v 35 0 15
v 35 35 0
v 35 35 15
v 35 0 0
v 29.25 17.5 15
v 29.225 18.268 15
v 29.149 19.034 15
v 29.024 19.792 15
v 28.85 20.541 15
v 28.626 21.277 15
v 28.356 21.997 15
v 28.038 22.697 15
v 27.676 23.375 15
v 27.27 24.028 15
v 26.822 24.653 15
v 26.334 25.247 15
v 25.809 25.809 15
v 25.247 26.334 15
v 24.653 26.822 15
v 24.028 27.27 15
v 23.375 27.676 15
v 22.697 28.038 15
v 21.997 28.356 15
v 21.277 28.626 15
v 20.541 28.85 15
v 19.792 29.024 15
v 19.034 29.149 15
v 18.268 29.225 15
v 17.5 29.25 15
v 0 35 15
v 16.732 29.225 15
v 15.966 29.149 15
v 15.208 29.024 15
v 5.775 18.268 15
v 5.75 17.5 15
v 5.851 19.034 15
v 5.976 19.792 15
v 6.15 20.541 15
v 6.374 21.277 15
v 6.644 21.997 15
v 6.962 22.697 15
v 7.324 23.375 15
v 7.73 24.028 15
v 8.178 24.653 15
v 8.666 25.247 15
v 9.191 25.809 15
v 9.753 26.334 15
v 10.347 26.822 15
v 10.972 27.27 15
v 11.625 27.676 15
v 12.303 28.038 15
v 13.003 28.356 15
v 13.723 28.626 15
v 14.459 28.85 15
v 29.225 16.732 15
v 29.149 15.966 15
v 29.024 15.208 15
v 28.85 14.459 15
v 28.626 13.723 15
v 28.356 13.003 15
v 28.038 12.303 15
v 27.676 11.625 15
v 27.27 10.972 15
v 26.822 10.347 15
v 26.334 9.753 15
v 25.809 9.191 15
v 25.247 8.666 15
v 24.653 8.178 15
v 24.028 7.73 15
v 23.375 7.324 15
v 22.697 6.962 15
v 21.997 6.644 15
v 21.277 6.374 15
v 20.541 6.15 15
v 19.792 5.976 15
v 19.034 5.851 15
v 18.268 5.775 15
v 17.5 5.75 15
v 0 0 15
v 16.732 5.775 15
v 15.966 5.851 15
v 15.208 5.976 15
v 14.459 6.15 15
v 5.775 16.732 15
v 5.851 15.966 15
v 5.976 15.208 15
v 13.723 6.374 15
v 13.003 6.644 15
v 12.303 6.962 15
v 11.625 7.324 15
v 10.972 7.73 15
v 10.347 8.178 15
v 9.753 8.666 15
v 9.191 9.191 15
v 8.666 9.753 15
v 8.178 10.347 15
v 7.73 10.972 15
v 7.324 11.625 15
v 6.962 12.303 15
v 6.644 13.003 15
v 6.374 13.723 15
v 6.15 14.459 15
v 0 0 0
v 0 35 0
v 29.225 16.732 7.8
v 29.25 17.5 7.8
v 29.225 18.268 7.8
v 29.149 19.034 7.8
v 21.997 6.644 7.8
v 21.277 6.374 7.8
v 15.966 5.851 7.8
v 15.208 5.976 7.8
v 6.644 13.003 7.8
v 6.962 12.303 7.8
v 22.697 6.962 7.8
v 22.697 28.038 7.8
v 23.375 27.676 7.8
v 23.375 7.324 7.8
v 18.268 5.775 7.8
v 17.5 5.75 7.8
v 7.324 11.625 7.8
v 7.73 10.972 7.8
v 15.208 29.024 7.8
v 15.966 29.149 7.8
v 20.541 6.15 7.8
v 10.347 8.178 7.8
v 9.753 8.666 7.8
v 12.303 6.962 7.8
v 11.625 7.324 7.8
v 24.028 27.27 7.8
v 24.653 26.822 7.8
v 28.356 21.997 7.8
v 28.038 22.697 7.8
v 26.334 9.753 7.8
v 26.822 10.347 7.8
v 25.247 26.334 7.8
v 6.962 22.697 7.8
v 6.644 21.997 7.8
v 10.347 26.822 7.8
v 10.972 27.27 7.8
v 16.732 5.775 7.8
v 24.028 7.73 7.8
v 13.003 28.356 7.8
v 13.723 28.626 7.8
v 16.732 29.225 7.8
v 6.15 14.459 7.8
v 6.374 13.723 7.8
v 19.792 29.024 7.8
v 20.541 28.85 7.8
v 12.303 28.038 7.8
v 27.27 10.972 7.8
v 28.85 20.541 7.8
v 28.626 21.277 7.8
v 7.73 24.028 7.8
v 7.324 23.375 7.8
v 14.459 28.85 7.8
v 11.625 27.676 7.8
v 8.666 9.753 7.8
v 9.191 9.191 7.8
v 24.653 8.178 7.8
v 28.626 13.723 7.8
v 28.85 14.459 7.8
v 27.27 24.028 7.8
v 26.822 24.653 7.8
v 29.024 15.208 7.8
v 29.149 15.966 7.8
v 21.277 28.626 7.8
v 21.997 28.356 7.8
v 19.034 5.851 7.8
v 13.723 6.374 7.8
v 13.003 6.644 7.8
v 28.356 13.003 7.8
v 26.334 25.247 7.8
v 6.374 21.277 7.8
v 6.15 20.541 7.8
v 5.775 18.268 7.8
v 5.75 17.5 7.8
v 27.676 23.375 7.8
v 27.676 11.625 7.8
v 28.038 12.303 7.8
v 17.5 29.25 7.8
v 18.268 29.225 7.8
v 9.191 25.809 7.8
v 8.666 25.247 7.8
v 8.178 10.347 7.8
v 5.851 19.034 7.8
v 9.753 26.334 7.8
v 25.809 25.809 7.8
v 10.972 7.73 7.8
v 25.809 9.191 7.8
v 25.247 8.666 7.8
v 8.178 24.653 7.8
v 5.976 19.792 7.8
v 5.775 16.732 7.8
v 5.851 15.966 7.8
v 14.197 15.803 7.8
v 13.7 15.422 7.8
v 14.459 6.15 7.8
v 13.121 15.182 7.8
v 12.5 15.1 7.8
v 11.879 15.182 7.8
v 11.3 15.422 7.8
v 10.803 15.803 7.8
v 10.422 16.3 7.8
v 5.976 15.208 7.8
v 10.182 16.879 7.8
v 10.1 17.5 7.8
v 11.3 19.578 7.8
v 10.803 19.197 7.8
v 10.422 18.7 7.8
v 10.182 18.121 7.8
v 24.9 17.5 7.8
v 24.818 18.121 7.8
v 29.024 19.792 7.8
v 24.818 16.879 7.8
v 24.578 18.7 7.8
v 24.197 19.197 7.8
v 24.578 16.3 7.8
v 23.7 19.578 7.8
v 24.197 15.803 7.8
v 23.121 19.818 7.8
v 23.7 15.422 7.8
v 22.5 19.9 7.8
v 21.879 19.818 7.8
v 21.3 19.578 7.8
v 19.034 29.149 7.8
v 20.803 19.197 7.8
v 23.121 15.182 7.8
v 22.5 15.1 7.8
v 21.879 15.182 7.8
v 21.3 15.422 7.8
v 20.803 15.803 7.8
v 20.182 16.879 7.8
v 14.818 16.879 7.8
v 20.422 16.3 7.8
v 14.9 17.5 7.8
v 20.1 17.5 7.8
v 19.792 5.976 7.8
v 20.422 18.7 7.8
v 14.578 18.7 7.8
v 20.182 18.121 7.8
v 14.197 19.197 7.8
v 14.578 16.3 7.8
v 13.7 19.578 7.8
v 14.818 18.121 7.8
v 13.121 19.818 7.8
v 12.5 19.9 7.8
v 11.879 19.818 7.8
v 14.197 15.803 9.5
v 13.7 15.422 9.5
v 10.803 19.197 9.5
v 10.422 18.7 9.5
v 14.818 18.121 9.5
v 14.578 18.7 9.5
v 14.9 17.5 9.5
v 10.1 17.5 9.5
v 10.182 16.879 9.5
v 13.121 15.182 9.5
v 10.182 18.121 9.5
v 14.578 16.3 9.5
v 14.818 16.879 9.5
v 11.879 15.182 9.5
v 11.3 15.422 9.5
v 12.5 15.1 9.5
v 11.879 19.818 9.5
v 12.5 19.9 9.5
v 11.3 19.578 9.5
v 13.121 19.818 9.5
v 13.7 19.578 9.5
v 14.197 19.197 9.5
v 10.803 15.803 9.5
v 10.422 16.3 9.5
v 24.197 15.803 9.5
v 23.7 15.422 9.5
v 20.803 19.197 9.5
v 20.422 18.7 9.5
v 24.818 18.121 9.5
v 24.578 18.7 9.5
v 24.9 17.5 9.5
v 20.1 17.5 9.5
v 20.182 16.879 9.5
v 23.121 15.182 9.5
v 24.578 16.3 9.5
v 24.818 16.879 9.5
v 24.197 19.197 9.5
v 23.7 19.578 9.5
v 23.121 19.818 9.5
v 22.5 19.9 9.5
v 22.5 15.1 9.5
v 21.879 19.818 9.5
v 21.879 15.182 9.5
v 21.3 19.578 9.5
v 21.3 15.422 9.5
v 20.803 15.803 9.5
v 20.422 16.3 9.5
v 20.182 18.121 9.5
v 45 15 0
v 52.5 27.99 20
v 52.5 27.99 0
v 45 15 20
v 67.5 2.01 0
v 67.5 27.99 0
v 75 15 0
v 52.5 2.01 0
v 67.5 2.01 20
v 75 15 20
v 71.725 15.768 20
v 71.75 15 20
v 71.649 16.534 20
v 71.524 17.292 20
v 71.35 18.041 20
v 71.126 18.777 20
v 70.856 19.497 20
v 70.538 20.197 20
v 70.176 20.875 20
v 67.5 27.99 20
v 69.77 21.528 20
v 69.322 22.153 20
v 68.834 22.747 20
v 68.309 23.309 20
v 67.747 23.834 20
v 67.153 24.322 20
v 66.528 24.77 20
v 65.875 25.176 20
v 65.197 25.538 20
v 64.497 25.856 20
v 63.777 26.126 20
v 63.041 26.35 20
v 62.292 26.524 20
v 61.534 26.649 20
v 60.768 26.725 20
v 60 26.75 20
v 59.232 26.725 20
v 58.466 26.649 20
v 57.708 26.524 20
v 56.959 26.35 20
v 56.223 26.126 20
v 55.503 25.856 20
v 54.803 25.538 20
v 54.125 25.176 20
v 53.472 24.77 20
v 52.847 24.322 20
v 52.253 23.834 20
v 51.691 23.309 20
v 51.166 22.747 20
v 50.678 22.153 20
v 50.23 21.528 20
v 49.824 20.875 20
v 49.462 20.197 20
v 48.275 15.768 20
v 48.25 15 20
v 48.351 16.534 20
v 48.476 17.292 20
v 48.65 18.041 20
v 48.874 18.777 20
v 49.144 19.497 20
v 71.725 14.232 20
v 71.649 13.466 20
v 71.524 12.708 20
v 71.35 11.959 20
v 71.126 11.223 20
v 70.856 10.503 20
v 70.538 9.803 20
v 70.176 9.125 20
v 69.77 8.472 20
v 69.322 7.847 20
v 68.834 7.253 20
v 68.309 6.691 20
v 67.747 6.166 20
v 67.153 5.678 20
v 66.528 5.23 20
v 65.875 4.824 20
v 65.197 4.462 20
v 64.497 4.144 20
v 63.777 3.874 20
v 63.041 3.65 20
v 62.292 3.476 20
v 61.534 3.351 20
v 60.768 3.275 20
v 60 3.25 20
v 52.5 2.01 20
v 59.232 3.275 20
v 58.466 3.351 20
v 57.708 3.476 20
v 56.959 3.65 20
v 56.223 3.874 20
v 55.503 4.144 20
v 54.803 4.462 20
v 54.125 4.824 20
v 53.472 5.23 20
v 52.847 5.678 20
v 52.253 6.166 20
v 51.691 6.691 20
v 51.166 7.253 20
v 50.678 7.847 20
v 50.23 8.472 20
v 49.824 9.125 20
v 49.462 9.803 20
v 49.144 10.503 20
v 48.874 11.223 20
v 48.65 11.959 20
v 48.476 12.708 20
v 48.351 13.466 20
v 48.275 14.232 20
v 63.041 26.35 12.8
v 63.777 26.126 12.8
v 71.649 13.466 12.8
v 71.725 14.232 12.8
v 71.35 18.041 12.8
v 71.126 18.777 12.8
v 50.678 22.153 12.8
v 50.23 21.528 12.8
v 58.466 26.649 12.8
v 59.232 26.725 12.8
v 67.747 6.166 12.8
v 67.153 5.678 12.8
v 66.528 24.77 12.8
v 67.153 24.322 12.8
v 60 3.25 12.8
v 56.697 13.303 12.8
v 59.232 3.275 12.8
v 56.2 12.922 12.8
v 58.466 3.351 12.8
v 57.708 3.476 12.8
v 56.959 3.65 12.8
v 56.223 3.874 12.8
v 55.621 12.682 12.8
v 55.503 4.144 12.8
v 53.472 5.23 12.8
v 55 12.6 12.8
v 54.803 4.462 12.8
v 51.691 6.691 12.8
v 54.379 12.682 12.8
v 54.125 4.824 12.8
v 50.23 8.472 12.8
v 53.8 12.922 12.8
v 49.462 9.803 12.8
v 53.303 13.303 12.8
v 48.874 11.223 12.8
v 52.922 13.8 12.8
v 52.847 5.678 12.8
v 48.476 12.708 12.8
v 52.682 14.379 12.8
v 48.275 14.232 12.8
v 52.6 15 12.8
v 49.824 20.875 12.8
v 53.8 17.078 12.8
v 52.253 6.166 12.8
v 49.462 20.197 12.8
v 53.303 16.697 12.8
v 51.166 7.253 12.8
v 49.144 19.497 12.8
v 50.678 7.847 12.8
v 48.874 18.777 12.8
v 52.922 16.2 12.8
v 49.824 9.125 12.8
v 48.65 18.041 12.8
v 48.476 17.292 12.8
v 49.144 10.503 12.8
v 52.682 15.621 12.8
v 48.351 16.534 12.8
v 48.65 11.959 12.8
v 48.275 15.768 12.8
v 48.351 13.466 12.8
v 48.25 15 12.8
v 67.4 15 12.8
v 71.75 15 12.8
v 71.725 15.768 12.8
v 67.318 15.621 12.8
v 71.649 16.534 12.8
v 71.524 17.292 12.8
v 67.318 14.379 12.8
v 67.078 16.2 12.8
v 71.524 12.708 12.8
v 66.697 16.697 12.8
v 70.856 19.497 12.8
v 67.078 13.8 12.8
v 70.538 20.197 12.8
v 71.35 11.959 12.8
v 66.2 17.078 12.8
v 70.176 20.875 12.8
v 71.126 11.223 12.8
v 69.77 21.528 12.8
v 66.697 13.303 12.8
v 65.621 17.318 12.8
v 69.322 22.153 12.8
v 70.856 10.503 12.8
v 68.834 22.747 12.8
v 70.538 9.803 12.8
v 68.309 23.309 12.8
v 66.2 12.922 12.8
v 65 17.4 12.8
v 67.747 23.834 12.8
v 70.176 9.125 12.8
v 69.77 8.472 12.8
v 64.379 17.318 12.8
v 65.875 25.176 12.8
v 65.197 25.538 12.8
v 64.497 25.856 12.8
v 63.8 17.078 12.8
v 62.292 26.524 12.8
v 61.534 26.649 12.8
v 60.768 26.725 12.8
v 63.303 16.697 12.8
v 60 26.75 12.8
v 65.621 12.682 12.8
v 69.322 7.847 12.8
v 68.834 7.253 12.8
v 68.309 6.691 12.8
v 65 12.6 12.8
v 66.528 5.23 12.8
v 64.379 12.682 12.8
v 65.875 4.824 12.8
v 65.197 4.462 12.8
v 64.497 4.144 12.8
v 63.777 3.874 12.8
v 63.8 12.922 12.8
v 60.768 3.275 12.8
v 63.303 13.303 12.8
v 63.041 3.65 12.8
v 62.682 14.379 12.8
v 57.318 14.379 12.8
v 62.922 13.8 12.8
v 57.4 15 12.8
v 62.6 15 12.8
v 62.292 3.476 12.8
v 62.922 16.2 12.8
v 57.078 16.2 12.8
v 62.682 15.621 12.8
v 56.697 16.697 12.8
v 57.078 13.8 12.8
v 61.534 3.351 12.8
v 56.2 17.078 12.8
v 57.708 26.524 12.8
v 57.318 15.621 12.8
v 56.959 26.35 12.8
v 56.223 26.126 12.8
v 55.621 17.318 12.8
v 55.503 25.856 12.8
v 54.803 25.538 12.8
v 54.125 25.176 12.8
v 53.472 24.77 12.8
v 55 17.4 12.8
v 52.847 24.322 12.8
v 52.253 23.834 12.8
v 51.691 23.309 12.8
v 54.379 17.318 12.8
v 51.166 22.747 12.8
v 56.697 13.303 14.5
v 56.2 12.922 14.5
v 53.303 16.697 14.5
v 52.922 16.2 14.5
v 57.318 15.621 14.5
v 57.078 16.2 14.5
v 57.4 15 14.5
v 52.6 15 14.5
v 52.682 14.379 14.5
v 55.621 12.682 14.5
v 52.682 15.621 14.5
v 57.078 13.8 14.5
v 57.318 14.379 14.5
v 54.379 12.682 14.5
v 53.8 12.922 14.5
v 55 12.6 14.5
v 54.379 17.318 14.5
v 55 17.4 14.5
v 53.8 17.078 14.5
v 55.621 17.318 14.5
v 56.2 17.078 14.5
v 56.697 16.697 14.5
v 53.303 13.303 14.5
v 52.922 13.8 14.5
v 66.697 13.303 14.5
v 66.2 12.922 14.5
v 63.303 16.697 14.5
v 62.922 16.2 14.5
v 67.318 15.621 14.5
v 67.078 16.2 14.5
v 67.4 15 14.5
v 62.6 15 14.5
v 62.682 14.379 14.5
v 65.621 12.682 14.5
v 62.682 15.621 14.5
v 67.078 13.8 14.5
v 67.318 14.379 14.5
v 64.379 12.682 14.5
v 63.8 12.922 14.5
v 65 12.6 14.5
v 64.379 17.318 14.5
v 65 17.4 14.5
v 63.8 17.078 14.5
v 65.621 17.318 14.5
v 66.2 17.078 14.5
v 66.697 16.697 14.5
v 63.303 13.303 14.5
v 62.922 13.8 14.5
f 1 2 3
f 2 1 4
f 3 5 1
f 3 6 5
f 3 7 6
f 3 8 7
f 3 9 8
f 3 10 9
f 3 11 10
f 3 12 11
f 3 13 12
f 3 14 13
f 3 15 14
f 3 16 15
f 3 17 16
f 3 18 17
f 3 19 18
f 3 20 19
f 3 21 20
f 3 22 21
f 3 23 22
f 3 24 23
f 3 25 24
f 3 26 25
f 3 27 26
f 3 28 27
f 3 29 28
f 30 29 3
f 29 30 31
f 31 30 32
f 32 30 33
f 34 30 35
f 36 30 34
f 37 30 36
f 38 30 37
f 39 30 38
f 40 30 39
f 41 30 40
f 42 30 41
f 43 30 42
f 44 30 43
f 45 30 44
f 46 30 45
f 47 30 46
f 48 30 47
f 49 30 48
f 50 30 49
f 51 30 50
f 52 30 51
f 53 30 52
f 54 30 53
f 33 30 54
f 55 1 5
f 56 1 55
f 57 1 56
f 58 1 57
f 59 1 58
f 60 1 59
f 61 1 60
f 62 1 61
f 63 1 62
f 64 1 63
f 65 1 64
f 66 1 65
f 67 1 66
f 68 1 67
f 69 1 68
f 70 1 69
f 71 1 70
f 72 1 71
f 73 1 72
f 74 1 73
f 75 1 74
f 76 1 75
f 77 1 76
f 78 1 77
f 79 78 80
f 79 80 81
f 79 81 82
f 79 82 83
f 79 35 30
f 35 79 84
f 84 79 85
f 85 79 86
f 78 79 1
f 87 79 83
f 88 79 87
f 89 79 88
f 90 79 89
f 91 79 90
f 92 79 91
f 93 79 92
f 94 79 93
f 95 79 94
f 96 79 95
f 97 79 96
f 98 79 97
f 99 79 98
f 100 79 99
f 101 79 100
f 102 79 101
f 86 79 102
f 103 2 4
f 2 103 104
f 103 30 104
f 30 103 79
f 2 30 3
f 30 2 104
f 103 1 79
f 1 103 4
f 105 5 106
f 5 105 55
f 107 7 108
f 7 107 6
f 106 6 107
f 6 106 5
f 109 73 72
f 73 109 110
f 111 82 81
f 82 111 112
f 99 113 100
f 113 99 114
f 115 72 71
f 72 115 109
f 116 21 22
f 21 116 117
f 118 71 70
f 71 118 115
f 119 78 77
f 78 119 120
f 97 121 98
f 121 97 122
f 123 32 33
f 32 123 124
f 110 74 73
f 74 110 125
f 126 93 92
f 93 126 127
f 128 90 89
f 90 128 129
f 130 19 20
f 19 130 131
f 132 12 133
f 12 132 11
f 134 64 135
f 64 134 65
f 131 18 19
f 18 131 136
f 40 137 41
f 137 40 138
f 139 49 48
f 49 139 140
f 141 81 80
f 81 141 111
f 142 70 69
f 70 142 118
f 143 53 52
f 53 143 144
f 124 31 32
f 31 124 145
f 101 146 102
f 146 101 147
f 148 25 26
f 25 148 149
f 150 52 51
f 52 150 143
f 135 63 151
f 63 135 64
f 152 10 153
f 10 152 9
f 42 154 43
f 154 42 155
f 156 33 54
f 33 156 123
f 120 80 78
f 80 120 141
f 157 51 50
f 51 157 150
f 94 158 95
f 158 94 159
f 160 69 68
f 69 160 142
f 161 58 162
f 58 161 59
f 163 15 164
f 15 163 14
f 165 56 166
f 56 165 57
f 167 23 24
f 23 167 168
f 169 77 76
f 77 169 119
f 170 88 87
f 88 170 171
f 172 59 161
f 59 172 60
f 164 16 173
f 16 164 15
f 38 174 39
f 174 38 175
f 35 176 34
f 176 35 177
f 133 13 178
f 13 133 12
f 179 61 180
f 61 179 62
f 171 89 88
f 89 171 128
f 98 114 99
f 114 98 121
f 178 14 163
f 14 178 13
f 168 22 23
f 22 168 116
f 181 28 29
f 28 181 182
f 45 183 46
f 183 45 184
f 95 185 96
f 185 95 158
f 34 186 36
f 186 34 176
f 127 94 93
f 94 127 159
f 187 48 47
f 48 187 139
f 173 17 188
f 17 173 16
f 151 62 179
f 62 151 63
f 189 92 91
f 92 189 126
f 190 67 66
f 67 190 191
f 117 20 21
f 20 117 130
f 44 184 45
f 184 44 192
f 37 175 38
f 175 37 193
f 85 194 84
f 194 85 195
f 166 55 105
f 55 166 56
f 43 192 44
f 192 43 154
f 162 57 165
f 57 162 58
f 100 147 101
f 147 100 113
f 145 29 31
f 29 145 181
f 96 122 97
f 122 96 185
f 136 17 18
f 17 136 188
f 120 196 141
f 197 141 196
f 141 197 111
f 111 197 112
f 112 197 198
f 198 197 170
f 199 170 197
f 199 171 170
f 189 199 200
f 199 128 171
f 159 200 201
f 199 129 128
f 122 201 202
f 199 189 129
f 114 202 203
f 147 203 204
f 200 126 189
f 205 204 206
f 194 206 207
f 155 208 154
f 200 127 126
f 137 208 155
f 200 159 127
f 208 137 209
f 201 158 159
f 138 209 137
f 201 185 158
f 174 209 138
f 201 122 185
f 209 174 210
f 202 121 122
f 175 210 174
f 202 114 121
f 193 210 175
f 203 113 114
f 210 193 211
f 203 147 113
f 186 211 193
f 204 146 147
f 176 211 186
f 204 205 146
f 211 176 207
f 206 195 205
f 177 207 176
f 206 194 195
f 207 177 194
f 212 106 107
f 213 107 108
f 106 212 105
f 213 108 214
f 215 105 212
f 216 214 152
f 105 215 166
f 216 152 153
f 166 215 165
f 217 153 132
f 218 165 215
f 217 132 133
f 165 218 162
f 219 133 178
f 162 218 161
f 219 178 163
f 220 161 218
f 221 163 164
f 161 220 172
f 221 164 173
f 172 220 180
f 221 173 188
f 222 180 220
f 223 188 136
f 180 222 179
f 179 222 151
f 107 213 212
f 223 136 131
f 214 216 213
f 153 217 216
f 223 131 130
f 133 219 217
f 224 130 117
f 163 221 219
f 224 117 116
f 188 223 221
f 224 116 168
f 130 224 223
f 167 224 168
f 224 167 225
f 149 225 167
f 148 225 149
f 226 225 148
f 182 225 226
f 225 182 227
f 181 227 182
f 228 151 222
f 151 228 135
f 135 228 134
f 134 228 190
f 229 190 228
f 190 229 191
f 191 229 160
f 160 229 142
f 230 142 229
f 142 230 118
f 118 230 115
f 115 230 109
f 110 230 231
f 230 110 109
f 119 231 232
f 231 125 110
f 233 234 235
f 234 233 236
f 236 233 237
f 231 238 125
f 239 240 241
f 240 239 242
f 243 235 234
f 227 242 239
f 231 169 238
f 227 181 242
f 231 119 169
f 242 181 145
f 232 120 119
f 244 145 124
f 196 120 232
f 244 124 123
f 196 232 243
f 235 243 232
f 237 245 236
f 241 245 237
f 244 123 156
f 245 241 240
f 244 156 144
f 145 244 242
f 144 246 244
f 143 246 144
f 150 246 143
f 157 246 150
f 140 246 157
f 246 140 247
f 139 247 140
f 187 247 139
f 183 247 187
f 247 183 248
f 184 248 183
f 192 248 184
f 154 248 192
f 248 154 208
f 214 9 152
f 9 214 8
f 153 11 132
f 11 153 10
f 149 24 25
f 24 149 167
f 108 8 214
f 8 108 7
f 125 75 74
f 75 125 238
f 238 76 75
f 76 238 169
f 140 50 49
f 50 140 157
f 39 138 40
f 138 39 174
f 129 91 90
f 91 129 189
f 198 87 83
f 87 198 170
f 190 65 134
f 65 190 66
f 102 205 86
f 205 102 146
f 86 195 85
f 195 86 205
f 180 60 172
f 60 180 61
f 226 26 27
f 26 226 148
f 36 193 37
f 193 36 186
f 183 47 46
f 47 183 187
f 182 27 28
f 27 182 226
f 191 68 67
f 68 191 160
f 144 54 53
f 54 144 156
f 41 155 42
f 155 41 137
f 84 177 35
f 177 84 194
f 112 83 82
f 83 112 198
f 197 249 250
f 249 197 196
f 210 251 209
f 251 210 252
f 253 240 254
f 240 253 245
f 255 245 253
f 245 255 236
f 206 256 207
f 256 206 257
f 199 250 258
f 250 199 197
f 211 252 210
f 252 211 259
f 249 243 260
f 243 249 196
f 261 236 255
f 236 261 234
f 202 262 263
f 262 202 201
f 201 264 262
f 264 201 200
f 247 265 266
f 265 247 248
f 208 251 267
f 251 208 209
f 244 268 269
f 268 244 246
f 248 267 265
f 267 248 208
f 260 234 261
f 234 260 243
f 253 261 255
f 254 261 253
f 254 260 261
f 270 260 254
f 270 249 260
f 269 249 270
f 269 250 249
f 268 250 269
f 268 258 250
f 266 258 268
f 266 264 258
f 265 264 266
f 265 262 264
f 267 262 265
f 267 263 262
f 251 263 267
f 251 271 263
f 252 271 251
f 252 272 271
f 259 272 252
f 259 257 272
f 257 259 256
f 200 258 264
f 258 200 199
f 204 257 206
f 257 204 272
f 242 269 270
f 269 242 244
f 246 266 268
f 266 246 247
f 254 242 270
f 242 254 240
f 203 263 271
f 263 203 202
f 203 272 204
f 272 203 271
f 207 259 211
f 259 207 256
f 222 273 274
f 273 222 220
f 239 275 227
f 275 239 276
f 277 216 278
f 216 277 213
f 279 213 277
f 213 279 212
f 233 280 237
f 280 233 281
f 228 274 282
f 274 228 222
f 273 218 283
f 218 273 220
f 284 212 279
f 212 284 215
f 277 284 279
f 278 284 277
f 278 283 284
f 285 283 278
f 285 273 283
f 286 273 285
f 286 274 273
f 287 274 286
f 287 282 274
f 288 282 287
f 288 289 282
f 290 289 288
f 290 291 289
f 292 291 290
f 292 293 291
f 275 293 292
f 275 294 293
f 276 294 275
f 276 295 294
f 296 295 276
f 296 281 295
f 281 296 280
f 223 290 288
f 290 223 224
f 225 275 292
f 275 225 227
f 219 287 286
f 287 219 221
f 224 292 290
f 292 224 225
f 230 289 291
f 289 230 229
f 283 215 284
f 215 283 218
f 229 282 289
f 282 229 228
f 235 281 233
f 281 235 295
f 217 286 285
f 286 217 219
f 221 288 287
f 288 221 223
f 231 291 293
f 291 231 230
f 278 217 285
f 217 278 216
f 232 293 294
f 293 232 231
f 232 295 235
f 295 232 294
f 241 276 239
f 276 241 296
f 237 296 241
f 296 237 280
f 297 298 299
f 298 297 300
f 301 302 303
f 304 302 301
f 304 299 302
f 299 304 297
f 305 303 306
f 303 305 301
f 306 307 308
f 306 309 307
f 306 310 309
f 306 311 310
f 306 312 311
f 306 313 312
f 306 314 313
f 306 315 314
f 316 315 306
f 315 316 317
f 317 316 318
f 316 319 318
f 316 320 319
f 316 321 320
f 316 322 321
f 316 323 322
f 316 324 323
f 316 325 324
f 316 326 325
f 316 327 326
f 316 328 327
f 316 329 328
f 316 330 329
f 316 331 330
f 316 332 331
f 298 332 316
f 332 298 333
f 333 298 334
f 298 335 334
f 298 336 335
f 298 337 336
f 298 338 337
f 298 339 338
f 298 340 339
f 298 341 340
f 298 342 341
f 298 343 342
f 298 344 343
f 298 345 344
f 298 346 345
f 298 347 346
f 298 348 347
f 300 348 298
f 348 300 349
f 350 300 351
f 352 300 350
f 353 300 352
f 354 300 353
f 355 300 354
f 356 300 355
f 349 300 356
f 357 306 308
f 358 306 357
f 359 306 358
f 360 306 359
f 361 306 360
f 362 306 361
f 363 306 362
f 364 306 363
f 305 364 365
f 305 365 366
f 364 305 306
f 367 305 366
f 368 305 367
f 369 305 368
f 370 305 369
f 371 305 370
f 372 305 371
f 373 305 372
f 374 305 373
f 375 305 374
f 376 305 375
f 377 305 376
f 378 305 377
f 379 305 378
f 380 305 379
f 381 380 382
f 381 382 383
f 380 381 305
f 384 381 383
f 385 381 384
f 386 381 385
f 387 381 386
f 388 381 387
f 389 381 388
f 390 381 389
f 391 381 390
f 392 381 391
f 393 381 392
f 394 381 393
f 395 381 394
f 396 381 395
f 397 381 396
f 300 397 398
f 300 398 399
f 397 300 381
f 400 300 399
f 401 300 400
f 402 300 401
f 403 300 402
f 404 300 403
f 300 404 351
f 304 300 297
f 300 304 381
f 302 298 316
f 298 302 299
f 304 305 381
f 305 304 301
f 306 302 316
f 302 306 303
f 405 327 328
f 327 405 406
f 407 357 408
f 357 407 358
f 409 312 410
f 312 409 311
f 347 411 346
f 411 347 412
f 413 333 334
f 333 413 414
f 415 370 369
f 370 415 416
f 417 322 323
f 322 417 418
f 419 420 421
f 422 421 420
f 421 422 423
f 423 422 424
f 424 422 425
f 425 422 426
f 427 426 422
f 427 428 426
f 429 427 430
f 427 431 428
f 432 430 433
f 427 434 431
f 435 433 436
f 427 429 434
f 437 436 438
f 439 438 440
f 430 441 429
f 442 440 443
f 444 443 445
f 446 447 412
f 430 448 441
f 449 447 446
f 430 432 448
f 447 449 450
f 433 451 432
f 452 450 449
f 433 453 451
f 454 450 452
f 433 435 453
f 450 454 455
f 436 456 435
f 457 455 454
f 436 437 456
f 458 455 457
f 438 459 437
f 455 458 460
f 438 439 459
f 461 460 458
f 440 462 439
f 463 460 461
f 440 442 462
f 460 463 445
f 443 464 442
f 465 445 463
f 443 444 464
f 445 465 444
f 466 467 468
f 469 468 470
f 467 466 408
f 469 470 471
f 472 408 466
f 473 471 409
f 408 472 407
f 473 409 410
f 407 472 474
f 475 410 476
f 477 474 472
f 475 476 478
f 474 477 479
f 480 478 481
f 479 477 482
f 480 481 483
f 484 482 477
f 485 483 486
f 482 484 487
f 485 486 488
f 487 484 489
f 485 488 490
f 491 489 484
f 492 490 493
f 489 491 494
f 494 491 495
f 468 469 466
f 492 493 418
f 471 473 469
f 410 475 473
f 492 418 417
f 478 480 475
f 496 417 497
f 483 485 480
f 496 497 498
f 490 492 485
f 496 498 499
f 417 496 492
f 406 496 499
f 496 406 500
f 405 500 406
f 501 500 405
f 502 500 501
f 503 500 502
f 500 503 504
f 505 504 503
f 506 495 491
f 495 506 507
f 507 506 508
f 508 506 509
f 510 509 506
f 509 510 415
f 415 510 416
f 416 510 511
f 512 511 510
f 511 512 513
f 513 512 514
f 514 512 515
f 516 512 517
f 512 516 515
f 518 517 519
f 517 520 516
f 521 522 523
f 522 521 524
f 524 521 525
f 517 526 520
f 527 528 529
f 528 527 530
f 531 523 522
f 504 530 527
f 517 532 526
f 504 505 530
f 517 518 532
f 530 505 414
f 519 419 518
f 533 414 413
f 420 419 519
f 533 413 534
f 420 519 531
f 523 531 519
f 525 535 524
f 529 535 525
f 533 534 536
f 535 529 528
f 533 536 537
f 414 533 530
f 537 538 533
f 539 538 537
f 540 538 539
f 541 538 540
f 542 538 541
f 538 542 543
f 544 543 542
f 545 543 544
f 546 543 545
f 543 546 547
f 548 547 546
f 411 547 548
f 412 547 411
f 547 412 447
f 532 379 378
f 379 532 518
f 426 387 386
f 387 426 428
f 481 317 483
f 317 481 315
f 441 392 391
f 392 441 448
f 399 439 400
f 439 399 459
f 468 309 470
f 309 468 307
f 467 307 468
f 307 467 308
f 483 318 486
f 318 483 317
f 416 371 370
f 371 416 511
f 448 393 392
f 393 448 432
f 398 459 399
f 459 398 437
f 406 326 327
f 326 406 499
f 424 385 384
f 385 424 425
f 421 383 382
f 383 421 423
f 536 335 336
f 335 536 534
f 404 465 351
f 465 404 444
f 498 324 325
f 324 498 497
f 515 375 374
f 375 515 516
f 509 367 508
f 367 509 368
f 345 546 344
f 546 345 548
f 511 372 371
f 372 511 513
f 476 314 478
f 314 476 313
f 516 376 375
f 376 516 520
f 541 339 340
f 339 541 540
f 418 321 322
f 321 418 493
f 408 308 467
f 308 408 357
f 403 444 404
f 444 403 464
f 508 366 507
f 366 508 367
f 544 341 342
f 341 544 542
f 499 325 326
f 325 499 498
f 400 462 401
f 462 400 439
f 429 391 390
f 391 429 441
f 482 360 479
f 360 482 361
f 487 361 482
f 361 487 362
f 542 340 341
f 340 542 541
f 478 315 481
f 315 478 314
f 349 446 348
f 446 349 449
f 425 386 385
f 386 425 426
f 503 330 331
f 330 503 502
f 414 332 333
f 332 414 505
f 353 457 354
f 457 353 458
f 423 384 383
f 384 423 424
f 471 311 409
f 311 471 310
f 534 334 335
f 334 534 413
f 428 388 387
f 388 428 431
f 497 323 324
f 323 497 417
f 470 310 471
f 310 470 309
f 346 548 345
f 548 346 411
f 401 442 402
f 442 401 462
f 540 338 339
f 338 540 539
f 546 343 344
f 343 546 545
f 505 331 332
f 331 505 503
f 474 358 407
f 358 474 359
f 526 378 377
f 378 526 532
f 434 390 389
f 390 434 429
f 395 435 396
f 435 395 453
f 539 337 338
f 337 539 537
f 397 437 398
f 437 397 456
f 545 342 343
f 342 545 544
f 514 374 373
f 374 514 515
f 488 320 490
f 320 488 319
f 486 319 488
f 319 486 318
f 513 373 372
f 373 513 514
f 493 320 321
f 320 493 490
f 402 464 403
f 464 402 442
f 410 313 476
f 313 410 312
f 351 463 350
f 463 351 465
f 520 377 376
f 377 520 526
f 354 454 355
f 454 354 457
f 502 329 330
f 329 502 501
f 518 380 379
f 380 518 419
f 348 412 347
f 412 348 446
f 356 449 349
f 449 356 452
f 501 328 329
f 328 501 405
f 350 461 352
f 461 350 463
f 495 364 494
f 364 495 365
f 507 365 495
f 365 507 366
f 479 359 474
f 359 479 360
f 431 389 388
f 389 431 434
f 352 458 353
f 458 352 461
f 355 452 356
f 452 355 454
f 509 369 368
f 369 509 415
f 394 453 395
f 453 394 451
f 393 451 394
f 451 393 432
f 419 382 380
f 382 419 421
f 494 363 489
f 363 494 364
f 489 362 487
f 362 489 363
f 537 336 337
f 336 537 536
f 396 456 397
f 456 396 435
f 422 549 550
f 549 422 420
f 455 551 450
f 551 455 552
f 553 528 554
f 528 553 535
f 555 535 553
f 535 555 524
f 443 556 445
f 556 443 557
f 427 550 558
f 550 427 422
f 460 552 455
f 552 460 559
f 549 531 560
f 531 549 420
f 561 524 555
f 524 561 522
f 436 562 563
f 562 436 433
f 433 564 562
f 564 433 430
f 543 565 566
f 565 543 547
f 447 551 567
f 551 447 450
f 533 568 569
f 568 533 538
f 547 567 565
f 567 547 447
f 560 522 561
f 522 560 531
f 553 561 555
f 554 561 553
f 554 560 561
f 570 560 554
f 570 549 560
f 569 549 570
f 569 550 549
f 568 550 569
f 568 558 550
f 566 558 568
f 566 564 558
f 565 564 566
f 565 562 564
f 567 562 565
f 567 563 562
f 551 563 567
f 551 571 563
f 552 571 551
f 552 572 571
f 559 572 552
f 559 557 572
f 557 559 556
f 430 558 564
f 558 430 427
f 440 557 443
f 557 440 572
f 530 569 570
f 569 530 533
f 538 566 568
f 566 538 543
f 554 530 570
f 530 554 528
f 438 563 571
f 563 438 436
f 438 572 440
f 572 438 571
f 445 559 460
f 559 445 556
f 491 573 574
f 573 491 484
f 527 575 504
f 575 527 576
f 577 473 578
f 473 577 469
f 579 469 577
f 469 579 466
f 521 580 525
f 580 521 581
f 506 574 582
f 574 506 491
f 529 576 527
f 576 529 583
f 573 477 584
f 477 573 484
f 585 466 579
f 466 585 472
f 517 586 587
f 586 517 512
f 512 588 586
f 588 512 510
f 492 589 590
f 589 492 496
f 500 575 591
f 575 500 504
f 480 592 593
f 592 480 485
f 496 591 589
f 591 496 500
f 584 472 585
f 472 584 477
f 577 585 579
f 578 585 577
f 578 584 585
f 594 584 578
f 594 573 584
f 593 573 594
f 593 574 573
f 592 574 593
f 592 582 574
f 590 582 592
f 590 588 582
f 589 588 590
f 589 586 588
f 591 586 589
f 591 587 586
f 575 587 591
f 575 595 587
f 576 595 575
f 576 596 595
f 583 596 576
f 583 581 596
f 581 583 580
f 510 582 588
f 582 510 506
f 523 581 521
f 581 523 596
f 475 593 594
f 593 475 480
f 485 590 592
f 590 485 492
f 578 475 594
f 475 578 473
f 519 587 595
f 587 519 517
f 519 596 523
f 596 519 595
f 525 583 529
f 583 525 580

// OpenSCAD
use <MCAD/regular_shapes.scad>

////////////////////////////////////////////////////////////////////////////////////////////////////////////////////////
// measurements

connector_diameter = 22.5;
connector_full_depth = 13.2;
connector_thread_depth = 6.0;

peg_depth = 1.7;
peg_diameter = 5.8;
peg_offset = 5.0;

////////////////////////////////////////////////////////////////////////////////////////////////////////////////////////
// settings

render_mode = "preview";
// render_mode = "print-v1";
// render_mode = "print-v2";

box_x = 35;
box_y = 35;
box_z = 15;

measurement_tolerance = 0.5;

holder_r = 15;
v2_offset_x = 60; // spacing between v1 and v2 in the preview
v2_box_z = 20;

////////////////////////////////////////////////////////////////////////////////////////////////////////////////////////
// calculations

connector_handle_depth = connector_full_depth - connector_thread_depth;

////////////////////////////////////////////////////////////////////////////////////////////////////////////////////////
// models

if( render_mode == "preview" )
{
    ConnectorToolV1();

    translate([ v2_offset_x, 0, 0 ])
        ConnectorToolV2();
}
else if( render_mode == "print-v1" )
{
    ConnectorToolV1();
}
else if( render_mode == "print-v2" )
{
    ConnectorToolV2();
}
else
{
    assert( false, str( "Unknown render mode: ", render_mode ) );
}

////////////////////////////////////////////////////////////////////////////////////////////////////////////////////////

// v1: square box
module ConnectorToolV1()
{
    render()
    {
        difference()
        {
            cube([ box_x, box_y, box_z ]);

            // cut out the cylinder
            translate([ box_x / 2, box_y / 2, box_z - connector_handle_depth ])
                cylinder( h = connector_handle_depth, r = connector_diameter / 2 + measurement_tolerance, $fn = 96 );
        }
    }

    color([ 0.5, 0, 0 ])
        translate([ box_x / 2 - peg_offset, box_y / 2, box_z - connector_handle_depth ])
            cylinder( h = peg_depth, r = peg_diameter / 2 - measurement_tolerance, $fn = 24 );

    color([ 0, 0, 0.5 ])
        translate([ box_x / 2 + peg_offset, box_y / 2, box_z - connector_handle_depth ])
            cylinder( h = peg_depth, r = peg_diameter / 2 - measurement_tolerance, $fn = 24 );
}

////////////////////////////////////////////////////////////////////////////////////////////////////////////////////////

// v2: hexagon
module ConnectorToolV2()
{
    render()
    {
        difference()
        {
            translate([ 0, holder_r, 0 ])
                hexagon_prism( radius = holder_r, height = v2_box_z ); // NOTE: octagon_prism also works great!

            // cut out the cylinder
            translate([ 0, holder_r, v2_box_z - connector_handle_depth ])
                cylinder( h = connector_handle_depth, r = connector_diameter / 2 + measurement_tolerance, $fn = 96 );
        }
    }

    color([ 0.5, 0, 0 ])
        translate([ -peg_offset, holder_r, v2_box_z - connector_handle_depth ])
            cylinder( h = peg_depth, r = peg_diameter / 2 - measurement_tolerance, $fn = 24 );

    color([ 0, 0, 0.5 ])
        translate([ peg_offset, holder_r, v2_box_z - connector_handle_depth ])
            cylinder( h = peg_depth, r = peg_diameter / 2 - measurement_tolerance, $fn = 24 );
}

////////////////////////////////////////////////////////////////////////////////////////////////////////////////////////
